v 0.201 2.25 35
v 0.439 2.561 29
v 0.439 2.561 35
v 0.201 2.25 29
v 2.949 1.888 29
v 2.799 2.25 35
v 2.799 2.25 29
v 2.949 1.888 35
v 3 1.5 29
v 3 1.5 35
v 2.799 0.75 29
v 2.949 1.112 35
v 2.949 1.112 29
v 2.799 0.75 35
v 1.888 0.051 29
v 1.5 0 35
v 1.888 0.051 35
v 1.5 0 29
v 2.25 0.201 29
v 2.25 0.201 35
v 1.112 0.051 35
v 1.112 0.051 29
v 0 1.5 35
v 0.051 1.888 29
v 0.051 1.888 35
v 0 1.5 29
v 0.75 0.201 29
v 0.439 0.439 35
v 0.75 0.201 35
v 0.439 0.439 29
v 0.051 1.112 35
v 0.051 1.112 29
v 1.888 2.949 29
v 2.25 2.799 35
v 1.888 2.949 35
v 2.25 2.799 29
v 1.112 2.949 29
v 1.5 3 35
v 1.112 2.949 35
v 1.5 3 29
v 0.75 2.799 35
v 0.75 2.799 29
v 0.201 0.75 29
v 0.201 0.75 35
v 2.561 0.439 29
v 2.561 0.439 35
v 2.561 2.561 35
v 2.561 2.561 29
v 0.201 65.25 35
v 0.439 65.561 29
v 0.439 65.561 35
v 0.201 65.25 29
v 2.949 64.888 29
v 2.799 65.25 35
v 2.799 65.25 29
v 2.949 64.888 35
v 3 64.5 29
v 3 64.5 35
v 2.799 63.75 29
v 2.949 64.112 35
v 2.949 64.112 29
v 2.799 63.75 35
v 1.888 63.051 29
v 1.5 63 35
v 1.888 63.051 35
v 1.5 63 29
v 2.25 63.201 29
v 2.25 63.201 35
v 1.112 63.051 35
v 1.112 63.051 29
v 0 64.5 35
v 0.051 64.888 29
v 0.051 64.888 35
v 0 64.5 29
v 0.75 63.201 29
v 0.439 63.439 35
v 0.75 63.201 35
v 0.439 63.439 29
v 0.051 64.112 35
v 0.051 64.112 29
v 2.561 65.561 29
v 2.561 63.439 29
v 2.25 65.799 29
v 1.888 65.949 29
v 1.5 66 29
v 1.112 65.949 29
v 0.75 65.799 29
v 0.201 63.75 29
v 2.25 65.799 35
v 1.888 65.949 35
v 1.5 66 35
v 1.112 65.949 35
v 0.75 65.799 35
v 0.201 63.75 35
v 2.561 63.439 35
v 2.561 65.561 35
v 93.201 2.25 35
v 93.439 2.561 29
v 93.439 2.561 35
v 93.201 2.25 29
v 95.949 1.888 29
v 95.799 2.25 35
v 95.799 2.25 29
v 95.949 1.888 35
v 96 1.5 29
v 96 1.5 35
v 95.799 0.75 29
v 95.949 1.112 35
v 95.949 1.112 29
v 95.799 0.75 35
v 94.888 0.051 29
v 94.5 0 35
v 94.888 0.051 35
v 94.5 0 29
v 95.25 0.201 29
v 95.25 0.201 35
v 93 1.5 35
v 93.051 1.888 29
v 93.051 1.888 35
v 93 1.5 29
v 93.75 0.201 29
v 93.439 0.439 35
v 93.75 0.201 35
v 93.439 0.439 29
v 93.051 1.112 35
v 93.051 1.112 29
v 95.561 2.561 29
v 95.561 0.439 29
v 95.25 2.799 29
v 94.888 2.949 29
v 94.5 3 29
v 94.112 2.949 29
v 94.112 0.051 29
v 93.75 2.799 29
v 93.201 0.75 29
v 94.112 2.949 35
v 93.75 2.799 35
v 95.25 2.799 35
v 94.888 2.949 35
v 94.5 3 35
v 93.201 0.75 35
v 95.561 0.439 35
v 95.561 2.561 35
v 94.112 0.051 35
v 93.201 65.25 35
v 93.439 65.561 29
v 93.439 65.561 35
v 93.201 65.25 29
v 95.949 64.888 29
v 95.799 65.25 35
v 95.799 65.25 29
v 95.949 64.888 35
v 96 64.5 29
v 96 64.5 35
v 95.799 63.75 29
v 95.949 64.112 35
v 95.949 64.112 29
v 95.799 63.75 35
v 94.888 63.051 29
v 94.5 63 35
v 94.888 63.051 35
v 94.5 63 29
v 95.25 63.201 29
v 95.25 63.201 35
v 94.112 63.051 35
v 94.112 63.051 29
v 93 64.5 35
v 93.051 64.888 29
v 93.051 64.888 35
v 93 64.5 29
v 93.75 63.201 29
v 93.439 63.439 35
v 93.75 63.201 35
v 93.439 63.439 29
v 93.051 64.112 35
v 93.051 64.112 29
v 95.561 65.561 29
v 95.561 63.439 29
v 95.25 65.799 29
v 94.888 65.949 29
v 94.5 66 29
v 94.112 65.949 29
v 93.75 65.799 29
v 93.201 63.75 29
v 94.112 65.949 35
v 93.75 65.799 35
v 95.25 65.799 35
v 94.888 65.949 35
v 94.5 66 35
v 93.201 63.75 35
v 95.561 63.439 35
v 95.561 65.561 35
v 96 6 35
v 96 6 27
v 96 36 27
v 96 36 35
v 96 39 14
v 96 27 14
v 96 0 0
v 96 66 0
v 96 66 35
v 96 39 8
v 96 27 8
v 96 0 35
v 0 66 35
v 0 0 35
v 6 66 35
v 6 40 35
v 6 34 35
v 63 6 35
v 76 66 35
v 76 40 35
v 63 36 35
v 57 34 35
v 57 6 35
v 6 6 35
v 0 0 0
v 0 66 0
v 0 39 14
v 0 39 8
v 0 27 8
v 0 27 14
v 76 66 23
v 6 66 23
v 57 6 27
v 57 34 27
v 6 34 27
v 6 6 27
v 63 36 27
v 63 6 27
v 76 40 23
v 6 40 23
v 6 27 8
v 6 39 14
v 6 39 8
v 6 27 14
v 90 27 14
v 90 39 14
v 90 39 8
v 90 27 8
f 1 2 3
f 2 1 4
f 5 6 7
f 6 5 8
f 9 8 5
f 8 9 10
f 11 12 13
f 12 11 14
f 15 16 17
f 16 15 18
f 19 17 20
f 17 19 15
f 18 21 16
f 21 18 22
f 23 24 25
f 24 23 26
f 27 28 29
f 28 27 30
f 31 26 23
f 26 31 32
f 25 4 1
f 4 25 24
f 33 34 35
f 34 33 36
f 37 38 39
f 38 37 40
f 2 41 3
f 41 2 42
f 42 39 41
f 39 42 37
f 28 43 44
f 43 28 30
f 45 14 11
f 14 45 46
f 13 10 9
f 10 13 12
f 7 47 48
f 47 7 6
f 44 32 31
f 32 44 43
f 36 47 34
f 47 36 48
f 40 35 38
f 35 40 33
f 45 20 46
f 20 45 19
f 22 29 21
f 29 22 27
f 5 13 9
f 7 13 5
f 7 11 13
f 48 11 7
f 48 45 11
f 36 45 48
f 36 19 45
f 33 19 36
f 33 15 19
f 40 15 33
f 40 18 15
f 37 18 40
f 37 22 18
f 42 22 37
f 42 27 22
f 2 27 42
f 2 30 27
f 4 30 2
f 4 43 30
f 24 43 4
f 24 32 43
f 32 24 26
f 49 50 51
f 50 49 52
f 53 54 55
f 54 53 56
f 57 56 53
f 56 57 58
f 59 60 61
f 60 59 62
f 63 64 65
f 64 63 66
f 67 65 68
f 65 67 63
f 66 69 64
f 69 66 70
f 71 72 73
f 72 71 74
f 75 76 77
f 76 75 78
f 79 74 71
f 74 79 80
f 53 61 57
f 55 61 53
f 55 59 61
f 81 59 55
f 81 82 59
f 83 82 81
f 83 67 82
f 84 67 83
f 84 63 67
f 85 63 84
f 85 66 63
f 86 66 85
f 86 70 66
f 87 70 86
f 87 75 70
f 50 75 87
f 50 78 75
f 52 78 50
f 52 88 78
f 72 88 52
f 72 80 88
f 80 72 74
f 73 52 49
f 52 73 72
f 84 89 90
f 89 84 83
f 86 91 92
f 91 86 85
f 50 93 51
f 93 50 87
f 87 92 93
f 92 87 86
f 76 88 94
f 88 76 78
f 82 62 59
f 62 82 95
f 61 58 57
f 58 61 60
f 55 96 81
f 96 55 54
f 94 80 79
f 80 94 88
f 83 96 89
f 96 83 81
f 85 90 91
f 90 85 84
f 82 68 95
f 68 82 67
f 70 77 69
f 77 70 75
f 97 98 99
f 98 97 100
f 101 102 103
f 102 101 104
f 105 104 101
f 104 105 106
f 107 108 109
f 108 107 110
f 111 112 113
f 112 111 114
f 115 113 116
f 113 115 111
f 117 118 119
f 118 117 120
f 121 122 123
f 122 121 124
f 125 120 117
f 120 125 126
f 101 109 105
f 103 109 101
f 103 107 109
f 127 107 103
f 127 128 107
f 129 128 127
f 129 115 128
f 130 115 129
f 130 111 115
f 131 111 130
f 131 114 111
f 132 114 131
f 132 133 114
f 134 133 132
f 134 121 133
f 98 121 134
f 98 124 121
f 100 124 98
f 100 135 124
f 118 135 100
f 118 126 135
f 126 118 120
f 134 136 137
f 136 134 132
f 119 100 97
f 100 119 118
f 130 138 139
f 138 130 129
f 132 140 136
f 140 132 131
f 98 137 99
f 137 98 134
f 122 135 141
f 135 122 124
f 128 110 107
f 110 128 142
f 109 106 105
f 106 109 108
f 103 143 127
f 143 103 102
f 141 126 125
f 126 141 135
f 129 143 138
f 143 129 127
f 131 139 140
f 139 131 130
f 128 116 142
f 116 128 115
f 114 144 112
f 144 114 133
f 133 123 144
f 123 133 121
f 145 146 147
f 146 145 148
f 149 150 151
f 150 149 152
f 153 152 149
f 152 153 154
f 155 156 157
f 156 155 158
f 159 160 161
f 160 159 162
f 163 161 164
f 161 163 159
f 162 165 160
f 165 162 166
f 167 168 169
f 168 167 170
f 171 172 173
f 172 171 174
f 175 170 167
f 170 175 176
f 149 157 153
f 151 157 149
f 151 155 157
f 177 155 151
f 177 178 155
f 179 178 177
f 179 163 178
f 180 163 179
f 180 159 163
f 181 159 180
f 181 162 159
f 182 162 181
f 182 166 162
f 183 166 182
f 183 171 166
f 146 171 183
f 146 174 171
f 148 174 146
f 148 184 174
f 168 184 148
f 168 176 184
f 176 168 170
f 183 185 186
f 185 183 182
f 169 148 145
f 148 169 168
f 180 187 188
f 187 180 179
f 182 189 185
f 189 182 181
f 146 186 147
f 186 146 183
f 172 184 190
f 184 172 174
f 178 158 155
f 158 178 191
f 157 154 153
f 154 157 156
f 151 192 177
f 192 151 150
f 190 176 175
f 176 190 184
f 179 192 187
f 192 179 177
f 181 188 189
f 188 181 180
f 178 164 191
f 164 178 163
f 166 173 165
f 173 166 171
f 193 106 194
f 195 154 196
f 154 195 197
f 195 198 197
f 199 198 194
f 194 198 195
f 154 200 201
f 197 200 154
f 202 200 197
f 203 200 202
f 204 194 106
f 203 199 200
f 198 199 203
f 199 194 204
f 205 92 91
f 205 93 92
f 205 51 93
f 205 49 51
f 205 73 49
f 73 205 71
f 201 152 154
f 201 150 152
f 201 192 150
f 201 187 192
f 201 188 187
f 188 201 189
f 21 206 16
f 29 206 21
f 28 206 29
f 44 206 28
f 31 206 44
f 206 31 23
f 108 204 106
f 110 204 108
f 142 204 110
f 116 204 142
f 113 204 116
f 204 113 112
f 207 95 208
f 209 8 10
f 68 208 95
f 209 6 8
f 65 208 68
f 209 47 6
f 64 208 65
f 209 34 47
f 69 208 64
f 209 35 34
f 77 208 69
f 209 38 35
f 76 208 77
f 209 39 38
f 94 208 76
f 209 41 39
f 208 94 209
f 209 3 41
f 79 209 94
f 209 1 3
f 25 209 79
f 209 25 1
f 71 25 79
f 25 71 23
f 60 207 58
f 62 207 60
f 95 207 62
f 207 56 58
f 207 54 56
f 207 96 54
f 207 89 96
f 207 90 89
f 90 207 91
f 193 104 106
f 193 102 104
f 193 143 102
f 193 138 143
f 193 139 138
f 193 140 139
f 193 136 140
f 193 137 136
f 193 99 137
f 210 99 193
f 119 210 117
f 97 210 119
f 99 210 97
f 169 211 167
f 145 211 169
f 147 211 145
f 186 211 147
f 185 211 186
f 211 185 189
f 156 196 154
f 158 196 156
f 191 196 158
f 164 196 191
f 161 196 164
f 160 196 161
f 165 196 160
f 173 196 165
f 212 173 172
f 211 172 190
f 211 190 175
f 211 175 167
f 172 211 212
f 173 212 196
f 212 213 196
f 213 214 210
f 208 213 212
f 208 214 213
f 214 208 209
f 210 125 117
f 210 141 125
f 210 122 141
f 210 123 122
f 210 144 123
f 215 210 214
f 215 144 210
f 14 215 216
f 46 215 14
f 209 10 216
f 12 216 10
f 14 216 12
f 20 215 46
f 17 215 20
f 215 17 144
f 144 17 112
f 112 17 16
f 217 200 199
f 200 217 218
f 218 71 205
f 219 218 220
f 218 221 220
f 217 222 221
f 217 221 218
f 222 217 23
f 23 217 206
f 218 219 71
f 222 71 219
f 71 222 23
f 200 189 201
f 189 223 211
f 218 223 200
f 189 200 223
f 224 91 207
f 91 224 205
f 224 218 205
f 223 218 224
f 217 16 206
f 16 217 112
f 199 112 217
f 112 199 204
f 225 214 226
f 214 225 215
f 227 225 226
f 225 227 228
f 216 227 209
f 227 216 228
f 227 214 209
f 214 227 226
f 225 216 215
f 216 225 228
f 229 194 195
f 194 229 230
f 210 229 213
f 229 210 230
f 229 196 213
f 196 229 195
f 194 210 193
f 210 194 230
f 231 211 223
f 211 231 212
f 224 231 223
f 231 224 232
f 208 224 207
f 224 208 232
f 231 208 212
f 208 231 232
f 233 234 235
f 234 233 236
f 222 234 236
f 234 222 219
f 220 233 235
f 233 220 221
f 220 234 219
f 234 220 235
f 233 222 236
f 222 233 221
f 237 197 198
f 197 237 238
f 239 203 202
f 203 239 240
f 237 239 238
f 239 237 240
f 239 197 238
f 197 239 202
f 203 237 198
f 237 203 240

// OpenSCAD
// Parametric electronics tray for the modular lawnmower.
// Holds an ESP32 dev board, a motor driver breakout, and a 3S LiPo
// so all the wiring of issue #70 lives inside one snapped-on enclosure.
// Issue #70 task: Schemi elettrici e wiring.
// Print in PETG or ASA, 100% infill; only the tray is printed (the electronics are COTS).

// Parameters (mm)
tray_length = 90;          // tray internal length
tray_width = 60;           // tray internal width
tray_wall = 3;              // tray wall thickness
tray_height = 35;          // tray wall height
esp_slot_l = 51;            // ESP32 dev board footprint length
esp_slot_w = 28;            // ESP32 dev board footprint width
driver_slot_l = 44;         // motor driver breakout length
driver_slot_w = 30;         // motor driver breakout width
lipo_slot_l = 70;            // 3S 2200mAh LiPo length
lipo_slot_w = 35;            // 3S 2200mAh LiPo width
slot_depth = 8;              // hold-down slot depth
cable_exit_w = 12;          // cable exit slit width
cable_exit_h = 6;            // cable exit slit height
lid_tether_dia = 3;        // M3 bolt holes for the snap-on lid
$fn = 96;

module pocket(l, w) {
  translate([tray_wall, tray_wall, tray_height - slot_depth])
    cube([l, w, slot_depth + 1]);
}

module electronics_tray() {
  difference() {
    // outer tray shell
    cube([tray_length + 2 * tray_wall, tray_width + 2 * tray_wall, tray_height], center = false);
    // ESP32 slot pocket
    translate([tray_wall, tray_wall, 0]) pocket(esp_slot_l, esp_slot_w);
    // motor driver slot pocket
    translate([tray_wall + esp_slot_l + 6, tray_wall, 0]) pocket(driver_slot_l, driver_slot_w);
    // LiPo slot pocket (deeper so the pack sits flat)
    translate([tray_wall, tray_wall + esp_slot_w + 6, 0])
      translate([tray_wall, tray_wall, tray_height - slot_depth - 4])
        cube([lipo_slot_l, lipo_slot_w, slot_depth + 5]);
    // cable exit slits on the two short ends
    translate([0, (tray_width + 2 * tray_wall) / 2 - cable_exit_w / 2, 8])
      cube([2 * tray_wall, cable_exit_w, cable_exit_h]);
    translate([tray_length, (tray_width + 2 * tray_wall) / 2 - cable_exit_w / 2, 8])
      cube([2 * tray_wall, cable_exit_w, cable_exit_h]);
    // four M3 tether holes for the snap-on lid
    for (x = [tray_wall / 2, tray_length + 1.5 * tray_wall]) {
      for (y = [tray_wall / 2, tray_width + 1.5 * tray_wall]) {
        translate([x, y, tray_height - 6]) cylinder(h = 8, d = lid_tether_dia, $fn = 24);
      }
    }
  }
}

electronics_tray();
// Mount the tray above the rear cross beam using the four M3 tether holes.
// Route the motor + sensor cables out the short-end slits to keep them away from the blade.
